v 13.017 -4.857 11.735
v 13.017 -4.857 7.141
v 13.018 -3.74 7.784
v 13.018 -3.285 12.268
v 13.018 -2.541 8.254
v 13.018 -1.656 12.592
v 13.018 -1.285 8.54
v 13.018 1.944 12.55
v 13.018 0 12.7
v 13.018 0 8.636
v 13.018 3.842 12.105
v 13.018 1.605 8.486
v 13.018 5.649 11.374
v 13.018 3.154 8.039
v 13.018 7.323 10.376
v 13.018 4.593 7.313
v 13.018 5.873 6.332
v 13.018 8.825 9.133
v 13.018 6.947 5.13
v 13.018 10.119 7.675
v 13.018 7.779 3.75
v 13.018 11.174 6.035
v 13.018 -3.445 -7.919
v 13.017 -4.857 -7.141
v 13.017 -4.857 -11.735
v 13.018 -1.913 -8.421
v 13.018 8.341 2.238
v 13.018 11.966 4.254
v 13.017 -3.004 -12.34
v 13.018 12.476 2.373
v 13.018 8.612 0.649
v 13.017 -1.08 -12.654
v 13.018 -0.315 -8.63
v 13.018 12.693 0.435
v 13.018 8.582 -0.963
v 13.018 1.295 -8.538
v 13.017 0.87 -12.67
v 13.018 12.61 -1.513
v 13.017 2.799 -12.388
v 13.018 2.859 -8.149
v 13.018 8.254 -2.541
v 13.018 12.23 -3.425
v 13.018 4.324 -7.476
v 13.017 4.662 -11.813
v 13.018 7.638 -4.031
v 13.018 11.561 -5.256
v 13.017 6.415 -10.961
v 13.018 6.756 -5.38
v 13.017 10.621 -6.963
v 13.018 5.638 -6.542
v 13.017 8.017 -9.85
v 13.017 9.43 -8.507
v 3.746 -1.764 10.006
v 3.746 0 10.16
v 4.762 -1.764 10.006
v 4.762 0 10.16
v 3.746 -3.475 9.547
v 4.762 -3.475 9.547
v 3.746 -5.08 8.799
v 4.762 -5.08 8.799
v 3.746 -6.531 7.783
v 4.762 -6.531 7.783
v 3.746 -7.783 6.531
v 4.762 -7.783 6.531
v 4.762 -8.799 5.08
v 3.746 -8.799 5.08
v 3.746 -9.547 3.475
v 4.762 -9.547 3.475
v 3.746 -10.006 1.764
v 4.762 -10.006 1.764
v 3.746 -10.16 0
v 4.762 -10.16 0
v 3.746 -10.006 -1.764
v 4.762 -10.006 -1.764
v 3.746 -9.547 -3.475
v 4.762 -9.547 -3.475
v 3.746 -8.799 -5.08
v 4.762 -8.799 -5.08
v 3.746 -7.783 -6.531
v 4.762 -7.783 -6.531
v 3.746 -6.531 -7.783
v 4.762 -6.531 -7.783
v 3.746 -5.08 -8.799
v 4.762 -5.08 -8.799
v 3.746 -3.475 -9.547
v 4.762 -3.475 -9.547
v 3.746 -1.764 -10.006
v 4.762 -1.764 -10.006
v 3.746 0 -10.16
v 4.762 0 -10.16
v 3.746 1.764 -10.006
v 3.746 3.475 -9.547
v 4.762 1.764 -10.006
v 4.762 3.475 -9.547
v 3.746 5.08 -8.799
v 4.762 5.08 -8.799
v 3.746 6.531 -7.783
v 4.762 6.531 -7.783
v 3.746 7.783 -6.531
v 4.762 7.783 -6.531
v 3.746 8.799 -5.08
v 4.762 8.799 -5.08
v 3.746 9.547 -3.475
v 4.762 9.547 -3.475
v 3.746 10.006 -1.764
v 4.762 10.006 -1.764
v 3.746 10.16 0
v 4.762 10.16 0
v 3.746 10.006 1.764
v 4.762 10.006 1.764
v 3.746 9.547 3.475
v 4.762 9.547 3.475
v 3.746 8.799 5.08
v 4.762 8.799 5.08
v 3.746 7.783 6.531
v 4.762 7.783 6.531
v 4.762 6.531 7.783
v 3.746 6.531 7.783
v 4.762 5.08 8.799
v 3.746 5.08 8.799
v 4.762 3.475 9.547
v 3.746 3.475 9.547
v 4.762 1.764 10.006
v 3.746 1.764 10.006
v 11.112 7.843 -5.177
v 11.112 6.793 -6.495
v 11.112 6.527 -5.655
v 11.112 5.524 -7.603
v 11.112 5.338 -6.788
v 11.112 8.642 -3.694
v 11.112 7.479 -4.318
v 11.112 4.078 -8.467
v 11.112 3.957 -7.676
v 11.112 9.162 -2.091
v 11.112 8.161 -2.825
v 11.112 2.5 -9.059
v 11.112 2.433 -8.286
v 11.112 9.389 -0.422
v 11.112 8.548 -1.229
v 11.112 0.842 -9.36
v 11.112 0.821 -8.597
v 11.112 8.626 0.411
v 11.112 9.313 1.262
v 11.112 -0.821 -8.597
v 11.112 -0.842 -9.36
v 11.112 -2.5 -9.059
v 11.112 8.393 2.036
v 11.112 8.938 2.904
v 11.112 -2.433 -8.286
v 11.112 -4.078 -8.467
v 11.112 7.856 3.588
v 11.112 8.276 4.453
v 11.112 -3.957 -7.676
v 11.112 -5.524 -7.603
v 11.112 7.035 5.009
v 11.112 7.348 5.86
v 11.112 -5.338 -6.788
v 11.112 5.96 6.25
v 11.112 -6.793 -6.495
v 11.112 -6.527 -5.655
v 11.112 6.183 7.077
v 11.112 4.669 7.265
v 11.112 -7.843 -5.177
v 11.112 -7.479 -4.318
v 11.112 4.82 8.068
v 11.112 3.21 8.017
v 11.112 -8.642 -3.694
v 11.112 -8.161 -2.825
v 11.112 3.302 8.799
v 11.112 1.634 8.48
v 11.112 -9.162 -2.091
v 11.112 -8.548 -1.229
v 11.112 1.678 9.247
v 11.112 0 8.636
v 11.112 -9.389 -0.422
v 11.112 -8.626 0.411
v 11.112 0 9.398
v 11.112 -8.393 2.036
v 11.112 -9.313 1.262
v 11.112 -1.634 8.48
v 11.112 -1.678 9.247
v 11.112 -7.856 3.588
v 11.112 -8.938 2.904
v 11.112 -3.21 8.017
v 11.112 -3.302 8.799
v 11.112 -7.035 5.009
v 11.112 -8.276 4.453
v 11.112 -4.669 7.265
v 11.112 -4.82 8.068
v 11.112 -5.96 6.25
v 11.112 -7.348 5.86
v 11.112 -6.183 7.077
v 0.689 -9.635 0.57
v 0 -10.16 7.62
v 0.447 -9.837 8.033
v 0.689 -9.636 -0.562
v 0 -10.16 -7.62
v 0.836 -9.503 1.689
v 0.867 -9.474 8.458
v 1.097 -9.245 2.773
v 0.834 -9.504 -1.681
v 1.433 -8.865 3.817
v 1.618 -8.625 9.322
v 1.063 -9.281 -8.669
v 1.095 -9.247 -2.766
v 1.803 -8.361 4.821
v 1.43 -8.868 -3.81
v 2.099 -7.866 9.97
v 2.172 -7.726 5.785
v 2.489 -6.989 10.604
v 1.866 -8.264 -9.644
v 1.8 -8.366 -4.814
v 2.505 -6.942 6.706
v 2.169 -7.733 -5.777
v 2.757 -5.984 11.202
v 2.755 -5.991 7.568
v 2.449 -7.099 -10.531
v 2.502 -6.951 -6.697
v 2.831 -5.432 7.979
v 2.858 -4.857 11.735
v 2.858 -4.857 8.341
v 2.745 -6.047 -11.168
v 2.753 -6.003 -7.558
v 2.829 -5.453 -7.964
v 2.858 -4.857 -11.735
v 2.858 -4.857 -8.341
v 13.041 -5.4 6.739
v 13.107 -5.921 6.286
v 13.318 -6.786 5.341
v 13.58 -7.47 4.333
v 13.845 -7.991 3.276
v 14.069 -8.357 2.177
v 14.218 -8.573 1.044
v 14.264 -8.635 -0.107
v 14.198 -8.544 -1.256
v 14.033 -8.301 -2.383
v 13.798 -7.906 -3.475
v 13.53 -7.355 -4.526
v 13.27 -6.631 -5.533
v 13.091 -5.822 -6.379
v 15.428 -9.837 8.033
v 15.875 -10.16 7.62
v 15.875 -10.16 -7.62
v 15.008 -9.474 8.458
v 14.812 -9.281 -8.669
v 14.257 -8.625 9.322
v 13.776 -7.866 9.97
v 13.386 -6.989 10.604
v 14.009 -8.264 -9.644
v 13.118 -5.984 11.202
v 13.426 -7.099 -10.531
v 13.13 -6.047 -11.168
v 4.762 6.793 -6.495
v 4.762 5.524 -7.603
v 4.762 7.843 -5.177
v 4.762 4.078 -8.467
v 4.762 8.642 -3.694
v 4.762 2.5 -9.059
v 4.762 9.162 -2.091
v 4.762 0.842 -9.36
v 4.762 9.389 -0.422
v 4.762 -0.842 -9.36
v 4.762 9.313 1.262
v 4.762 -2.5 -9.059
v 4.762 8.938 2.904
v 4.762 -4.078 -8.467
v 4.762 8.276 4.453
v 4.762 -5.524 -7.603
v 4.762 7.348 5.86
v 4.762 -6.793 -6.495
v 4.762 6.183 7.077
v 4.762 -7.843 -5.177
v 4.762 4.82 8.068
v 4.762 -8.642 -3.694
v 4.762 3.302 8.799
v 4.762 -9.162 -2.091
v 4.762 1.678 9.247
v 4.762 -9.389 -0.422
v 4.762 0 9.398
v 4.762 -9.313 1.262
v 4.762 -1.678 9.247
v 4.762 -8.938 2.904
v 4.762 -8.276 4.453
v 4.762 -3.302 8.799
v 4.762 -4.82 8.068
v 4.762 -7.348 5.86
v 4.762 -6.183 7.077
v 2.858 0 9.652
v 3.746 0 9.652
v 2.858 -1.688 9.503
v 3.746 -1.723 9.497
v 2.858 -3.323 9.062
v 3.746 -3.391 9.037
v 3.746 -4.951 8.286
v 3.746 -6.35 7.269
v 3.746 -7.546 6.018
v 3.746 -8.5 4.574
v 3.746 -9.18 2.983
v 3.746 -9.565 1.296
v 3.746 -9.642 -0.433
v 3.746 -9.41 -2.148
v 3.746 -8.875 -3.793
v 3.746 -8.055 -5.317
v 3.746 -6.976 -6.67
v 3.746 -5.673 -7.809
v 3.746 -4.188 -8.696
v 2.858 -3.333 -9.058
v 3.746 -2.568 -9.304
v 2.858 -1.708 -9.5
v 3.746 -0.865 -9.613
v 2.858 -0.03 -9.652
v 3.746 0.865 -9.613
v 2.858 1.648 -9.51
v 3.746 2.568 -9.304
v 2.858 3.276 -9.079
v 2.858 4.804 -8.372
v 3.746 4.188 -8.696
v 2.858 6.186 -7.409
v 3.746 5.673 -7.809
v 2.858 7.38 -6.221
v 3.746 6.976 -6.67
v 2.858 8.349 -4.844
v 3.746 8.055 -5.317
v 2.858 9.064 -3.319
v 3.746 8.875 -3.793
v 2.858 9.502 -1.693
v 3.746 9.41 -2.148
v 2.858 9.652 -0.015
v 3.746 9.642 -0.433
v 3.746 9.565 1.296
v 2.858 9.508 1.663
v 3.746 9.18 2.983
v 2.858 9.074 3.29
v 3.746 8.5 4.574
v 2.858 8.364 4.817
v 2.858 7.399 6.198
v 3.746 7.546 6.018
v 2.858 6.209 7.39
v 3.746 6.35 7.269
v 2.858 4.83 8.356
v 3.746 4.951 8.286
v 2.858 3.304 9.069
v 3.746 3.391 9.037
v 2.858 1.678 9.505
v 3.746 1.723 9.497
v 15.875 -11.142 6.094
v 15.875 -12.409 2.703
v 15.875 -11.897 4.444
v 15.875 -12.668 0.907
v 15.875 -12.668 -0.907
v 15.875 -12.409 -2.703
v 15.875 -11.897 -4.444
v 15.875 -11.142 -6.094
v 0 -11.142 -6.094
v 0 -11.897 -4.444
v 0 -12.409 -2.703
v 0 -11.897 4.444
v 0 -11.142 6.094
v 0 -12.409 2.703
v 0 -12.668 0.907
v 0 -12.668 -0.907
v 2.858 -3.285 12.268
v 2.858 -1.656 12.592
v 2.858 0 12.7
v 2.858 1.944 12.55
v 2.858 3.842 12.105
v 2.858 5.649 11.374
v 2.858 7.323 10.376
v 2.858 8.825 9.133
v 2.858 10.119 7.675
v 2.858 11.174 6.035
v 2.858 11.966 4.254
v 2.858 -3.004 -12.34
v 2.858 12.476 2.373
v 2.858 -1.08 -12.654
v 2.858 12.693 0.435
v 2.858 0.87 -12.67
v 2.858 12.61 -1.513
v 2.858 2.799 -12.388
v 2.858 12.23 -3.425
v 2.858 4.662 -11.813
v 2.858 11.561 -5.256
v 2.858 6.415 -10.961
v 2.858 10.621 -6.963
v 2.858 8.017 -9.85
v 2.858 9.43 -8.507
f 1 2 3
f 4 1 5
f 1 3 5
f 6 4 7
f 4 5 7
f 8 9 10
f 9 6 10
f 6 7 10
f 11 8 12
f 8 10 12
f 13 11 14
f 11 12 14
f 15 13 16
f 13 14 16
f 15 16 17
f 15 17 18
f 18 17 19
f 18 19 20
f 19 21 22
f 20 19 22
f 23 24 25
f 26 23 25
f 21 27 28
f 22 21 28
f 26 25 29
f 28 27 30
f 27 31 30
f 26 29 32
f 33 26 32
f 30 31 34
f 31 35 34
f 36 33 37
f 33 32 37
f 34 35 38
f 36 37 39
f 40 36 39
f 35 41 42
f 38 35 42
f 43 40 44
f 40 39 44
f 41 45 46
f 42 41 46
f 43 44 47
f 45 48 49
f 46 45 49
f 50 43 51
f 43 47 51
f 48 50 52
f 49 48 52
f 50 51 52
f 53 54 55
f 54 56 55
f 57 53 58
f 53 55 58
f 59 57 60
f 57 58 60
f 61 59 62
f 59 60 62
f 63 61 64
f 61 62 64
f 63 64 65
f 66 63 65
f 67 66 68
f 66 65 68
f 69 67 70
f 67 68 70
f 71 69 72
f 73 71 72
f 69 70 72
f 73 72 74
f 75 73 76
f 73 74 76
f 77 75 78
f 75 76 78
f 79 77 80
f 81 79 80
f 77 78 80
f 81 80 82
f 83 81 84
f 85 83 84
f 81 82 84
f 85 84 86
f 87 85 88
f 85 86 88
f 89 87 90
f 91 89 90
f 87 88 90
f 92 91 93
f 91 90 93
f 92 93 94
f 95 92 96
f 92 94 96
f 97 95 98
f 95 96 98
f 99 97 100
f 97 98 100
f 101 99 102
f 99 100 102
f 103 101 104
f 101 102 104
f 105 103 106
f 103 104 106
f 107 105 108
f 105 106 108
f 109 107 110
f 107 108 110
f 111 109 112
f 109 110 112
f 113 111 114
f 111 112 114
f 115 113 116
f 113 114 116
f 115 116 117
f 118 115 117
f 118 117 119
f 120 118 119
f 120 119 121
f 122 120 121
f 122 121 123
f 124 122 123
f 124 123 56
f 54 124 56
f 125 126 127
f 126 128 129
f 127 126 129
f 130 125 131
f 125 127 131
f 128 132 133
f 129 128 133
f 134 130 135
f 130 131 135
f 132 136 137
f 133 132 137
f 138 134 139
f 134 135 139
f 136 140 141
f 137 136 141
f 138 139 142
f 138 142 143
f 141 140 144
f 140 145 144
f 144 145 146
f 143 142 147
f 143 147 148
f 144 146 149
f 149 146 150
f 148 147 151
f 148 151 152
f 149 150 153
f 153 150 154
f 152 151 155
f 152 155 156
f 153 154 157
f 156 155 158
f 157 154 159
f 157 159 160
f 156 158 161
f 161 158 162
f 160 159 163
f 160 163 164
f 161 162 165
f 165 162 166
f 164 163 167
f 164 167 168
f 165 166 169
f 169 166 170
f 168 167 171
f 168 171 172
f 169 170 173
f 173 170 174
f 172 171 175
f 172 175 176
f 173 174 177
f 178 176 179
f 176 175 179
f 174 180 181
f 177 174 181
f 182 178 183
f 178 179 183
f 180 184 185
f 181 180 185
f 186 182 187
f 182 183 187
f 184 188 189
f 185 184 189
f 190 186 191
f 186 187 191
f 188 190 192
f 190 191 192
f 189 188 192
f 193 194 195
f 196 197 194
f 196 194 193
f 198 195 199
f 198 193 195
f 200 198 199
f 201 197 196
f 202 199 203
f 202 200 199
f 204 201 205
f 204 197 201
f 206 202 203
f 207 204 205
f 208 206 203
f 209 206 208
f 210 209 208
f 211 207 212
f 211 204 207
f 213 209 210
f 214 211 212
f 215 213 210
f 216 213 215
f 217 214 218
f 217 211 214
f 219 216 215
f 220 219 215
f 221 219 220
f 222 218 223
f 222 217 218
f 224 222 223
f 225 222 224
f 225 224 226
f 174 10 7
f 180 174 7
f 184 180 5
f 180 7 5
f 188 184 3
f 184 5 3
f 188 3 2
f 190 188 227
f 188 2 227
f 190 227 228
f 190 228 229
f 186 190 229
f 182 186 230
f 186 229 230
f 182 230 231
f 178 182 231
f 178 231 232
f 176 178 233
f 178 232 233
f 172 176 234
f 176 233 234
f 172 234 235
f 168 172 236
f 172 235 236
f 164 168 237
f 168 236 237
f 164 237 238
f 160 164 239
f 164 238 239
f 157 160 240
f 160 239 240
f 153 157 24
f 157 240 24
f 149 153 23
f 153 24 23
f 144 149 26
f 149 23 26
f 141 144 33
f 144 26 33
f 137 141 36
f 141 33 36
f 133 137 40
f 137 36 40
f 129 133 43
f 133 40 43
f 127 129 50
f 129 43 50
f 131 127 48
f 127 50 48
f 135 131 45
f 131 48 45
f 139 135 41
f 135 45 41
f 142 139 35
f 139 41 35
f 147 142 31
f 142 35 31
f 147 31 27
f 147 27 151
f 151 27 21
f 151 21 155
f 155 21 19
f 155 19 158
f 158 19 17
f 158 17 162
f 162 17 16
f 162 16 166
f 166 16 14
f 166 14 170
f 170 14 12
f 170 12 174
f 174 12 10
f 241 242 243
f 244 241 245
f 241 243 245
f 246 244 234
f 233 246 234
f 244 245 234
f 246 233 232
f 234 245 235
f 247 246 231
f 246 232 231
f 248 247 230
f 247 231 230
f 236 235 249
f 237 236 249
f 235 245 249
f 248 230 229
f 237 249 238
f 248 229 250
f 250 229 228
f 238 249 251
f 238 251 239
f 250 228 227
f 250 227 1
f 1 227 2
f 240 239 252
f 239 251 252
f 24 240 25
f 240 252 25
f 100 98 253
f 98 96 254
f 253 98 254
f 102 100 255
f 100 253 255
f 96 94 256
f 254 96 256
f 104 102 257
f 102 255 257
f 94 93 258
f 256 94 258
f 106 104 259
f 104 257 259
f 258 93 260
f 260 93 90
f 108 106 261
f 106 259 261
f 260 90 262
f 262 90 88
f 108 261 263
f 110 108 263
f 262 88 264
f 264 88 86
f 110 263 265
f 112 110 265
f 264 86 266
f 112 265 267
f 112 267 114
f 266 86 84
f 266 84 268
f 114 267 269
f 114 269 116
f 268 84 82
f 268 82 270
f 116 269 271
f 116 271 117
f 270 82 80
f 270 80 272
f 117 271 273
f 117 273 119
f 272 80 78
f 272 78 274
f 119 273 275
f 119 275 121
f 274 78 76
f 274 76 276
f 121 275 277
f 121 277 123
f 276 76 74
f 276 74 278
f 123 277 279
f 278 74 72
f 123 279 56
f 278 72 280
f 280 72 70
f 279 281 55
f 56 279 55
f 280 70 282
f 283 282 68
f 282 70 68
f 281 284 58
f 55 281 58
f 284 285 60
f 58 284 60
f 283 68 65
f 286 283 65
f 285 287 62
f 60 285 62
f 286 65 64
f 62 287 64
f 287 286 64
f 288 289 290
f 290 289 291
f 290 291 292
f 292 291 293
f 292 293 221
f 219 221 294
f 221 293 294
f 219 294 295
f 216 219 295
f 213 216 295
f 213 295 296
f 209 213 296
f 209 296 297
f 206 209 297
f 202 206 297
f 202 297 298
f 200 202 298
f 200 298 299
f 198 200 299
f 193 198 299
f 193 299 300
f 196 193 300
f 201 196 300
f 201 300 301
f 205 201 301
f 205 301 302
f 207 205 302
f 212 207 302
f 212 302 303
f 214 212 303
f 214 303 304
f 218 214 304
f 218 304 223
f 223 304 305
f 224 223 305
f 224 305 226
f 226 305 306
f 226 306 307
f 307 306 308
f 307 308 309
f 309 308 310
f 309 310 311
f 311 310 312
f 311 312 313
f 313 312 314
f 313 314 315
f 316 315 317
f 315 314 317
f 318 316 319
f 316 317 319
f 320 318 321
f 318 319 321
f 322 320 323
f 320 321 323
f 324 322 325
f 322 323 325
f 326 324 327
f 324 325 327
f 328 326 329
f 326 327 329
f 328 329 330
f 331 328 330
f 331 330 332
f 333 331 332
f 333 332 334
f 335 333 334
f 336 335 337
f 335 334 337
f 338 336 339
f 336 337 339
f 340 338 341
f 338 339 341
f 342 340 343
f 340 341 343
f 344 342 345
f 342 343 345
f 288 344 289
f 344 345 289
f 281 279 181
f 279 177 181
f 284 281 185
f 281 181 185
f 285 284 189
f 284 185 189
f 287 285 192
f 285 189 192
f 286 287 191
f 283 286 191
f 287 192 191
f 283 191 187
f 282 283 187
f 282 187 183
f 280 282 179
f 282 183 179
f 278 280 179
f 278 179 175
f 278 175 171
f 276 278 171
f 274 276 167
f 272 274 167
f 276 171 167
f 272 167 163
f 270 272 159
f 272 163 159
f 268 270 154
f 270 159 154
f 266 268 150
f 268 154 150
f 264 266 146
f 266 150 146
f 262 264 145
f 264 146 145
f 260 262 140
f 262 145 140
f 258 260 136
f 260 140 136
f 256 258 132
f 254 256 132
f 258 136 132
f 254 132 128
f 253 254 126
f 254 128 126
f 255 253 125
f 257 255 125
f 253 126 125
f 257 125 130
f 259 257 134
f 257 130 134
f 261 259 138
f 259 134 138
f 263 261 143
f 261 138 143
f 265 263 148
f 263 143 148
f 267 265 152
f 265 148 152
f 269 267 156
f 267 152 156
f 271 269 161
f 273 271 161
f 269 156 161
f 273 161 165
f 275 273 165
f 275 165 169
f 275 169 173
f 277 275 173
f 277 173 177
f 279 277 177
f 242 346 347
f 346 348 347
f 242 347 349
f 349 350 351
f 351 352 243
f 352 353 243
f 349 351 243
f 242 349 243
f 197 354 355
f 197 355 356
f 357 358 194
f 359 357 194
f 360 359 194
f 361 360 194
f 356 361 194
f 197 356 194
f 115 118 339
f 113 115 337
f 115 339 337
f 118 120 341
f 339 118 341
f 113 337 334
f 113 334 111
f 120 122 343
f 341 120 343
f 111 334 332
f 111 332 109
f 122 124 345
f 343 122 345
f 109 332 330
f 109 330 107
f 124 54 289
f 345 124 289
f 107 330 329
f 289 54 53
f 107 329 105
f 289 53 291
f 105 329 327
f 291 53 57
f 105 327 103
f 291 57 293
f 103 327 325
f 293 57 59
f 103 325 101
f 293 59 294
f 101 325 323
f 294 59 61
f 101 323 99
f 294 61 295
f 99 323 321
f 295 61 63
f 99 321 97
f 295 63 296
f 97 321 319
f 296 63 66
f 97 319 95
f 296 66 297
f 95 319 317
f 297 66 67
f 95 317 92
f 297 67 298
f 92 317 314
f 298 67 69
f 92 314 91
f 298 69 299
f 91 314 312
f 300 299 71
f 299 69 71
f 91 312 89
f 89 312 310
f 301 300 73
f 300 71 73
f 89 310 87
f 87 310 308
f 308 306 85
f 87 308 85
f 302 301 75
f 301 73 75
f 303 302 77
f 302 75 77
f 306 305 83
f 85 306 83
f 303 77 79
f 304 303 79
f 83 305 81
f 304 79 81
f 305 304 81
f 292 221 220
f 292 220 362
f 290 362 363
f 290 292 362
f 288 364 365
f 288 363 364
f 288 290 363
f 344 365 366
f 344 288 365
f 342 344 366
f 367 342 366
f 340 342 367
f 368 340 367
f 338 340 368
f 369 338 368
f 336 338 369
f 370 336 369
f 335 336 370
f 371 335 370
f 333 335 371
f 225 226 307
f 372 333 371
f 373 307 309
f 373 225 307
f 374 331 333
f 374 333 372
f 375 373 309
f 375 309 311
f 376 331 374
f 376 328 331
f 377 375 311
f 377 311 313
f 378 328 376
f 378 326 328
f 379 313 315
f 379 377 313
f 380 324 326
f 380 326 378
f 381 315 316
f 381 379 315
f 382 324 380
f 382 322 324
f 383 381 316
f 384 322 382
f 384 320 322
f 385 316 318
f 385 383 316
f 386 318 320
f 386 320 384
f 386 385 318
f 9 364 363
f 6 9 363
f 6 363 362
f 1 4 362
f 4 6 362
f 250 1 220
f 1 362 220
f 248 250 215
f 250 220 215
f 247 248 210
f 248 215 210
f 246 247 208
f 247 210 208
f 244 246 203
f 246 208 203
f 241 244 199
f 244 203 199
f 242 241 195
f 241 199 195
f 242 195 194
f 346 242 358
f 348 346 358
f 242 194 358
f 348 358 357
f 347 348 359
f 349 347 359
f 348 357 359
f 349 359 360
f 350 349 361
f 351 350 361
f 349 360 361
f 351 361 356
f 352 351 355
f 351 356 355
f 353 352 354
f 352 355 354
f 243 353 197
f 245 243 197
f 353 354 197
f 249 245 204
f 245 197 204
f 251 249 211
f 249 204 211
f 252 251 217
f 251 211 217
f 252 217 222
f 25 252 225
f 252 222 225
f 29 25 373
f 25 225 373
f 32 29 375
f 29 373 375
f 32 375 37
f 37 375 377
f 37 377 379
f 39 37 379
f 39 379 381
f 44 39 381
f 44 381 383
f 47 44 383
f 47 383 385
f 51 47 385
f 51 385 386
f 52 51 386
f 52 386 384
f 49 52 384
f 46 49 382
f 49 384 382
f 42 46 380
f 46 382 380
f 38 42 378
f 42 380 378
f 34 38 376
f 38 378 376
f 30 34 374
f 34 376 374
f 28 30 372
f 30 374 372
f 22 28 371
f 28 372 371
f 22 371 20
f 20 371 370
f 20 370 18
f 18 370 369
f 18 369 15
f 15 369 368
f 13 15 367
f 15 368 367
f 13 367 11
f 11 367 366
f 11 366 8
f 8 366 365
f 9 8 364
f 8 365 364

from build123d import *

# Parameters (mm, degrees)
CUT_EXTRUDE1_DEPTH      = 24.970724332
CUT_EXTRUDE1_DEPTH_BACK = 24.970724332


with BuildPart() as part:
    # Sketch2 → Revolve1 (revolve)
    with BuildSketch(Plane(origin=(0, 0, 0), x_dir=(1, 0, 0), z_dir=(0, 1, 0)), mode=Mode.PRIVATE) as revolve1_sk:
        Polygon((4.7625, 9.398), (11.1125, 9.398), (11.1125, 8.636), (15.875, 8.636), (15.875, 12.7), (0, 12.7), (0, 9.652), (3.7465, 9.652), (3.7465, 10.16), (4.7625, 10.16), align=None)
    revolve(revolve1_sk.sketch.rotate(Axis((0, 0, 0), (1, 0, 0)), 180), axis=Axis((0, 0, 0), (1, 0, 0)))

    # Sketch6 → Cut-Extrude1 (cut, two sides: drawn at the far end of the back side and taken through both)
    with BuildSketch(Plane.XY.offset(-CUT_EXTRUDE1_DEPTH_BACK)):
        with BuildLine():
            Line((0, 12.7), (0, -10.16))
            ThreePointArc((0, -10.16), (2.097664354, -7.868773916), (2.8575, -4.856704444))
            Line((2.8575, -4.856704444), (2.8575, 12.7))
            Line((2.8575, 12.7), (0, 12.7))
        make_face()
        with BuildLine():
            ThreePointArc((15.875, -10.16), (13.777335646, -7.868773916), (13.0175, -4.856704444))
            Line((13.0175, -4.856704444), (13.0175, 12.7))
            Line((13.0175, 12.7), (15.875, 12.7))
            Line((15.875, 12.7), (15.875, -10.16))
        make_face()
    extrude(amount=CUT_EXTRUDE1_DEPTH + CUT_EXTRUDE1_DEPTH_BACK, mode=Mode.SUBTRACT)


solid = part.part
